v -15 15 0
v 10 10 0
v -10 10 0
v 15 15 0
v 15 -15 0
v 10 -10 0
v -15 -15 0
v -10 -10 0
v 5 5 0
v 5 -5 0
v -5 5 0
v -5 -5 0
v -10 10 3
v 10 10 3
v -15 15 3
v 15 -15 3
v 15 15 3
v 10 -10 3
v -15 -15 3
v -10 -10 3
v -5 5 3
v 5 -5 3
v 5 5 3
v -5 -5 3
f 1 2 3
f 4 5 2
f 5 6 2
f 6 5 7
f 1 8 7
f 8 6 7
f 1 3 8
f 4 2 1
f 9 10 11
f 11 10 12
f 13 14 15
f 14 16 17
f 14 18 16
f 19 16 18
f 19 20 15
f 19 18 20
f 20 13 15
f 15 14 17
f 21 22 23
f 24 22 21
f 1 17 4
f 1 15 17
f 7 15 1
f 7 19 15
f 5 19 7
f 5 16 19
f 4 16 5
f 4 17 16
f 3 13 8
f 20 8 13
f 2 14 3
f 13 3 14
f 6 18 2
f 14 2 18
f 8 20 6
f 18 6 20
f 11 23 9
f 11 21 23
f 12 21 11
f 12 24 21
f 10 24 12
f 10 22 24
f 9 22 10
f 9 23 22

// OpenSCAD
linear_extrude(3) union(){ difference(){ square(30, center=true); square(20, center=true); } square(10, center=true); }
